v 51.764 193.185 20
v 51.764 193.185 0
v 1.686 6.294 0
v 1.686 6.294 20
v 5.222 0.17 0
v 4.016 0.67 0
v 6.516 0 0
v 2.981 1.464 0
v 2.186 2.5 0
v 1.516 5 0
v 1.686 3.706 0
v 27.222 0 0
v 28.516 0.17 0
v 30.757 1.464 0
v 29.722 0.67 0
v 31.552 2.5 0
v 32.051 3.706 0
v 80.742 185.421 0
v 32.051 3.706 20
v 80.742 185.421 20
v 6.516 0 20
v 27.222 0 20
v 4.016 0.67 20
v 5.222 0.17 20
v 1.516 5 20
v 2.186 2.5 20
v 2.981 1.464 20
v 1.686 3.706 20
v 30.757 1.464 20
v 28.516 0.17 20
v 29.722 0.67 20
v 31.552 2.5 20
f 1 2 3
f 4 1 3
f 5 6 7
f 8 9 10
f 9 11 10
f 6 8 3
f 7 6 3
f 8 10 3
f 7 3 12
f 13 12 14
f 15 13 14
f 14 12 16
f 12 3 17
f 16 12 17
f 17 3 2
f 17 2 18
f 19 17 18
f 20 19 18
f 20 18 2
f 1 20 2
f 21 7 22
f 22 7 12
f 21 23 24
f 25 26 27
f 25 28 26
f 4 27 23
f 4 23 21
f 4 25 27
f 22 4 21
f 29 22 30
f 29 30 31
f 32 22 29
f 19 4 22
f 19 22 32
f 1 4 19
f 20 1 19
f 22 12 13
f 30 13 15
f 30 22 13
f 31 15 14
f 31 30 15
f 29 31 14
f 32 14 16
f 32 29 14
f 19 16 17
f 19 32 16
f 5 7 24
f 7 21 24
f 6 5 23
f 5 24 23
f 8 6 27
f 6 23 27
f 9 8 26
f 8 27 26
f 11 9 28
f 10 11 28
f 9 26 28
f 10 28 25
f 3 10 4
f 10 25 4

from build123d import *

# Parameters (mm, degrees)
BOSS_EXTRU_1_DEPTH = 20
CONG_1_R           = 5


with BuildPart() as part:
    # Esquisse1 → Boss.-Extru.1 (new body)
    with BuildSketch(Plane.XY):
        Polygon((0, 0), (31.058285412, 0), (80.741583809, 185.420593905), (51.763809021, 193.185165258), align=None)
    extrude(amount=BOSS_EXTRU_1_DEPTH)

    # Congé1
    cong_1_edges = [part.edges().sort_by_distance(p)[0] for p in [
        (31.058285412, 0, 10),
        (0, 0, 10),
    ]]
    fillet(cong_1_edges, radius=CONG_1_R)


solid = part.part
